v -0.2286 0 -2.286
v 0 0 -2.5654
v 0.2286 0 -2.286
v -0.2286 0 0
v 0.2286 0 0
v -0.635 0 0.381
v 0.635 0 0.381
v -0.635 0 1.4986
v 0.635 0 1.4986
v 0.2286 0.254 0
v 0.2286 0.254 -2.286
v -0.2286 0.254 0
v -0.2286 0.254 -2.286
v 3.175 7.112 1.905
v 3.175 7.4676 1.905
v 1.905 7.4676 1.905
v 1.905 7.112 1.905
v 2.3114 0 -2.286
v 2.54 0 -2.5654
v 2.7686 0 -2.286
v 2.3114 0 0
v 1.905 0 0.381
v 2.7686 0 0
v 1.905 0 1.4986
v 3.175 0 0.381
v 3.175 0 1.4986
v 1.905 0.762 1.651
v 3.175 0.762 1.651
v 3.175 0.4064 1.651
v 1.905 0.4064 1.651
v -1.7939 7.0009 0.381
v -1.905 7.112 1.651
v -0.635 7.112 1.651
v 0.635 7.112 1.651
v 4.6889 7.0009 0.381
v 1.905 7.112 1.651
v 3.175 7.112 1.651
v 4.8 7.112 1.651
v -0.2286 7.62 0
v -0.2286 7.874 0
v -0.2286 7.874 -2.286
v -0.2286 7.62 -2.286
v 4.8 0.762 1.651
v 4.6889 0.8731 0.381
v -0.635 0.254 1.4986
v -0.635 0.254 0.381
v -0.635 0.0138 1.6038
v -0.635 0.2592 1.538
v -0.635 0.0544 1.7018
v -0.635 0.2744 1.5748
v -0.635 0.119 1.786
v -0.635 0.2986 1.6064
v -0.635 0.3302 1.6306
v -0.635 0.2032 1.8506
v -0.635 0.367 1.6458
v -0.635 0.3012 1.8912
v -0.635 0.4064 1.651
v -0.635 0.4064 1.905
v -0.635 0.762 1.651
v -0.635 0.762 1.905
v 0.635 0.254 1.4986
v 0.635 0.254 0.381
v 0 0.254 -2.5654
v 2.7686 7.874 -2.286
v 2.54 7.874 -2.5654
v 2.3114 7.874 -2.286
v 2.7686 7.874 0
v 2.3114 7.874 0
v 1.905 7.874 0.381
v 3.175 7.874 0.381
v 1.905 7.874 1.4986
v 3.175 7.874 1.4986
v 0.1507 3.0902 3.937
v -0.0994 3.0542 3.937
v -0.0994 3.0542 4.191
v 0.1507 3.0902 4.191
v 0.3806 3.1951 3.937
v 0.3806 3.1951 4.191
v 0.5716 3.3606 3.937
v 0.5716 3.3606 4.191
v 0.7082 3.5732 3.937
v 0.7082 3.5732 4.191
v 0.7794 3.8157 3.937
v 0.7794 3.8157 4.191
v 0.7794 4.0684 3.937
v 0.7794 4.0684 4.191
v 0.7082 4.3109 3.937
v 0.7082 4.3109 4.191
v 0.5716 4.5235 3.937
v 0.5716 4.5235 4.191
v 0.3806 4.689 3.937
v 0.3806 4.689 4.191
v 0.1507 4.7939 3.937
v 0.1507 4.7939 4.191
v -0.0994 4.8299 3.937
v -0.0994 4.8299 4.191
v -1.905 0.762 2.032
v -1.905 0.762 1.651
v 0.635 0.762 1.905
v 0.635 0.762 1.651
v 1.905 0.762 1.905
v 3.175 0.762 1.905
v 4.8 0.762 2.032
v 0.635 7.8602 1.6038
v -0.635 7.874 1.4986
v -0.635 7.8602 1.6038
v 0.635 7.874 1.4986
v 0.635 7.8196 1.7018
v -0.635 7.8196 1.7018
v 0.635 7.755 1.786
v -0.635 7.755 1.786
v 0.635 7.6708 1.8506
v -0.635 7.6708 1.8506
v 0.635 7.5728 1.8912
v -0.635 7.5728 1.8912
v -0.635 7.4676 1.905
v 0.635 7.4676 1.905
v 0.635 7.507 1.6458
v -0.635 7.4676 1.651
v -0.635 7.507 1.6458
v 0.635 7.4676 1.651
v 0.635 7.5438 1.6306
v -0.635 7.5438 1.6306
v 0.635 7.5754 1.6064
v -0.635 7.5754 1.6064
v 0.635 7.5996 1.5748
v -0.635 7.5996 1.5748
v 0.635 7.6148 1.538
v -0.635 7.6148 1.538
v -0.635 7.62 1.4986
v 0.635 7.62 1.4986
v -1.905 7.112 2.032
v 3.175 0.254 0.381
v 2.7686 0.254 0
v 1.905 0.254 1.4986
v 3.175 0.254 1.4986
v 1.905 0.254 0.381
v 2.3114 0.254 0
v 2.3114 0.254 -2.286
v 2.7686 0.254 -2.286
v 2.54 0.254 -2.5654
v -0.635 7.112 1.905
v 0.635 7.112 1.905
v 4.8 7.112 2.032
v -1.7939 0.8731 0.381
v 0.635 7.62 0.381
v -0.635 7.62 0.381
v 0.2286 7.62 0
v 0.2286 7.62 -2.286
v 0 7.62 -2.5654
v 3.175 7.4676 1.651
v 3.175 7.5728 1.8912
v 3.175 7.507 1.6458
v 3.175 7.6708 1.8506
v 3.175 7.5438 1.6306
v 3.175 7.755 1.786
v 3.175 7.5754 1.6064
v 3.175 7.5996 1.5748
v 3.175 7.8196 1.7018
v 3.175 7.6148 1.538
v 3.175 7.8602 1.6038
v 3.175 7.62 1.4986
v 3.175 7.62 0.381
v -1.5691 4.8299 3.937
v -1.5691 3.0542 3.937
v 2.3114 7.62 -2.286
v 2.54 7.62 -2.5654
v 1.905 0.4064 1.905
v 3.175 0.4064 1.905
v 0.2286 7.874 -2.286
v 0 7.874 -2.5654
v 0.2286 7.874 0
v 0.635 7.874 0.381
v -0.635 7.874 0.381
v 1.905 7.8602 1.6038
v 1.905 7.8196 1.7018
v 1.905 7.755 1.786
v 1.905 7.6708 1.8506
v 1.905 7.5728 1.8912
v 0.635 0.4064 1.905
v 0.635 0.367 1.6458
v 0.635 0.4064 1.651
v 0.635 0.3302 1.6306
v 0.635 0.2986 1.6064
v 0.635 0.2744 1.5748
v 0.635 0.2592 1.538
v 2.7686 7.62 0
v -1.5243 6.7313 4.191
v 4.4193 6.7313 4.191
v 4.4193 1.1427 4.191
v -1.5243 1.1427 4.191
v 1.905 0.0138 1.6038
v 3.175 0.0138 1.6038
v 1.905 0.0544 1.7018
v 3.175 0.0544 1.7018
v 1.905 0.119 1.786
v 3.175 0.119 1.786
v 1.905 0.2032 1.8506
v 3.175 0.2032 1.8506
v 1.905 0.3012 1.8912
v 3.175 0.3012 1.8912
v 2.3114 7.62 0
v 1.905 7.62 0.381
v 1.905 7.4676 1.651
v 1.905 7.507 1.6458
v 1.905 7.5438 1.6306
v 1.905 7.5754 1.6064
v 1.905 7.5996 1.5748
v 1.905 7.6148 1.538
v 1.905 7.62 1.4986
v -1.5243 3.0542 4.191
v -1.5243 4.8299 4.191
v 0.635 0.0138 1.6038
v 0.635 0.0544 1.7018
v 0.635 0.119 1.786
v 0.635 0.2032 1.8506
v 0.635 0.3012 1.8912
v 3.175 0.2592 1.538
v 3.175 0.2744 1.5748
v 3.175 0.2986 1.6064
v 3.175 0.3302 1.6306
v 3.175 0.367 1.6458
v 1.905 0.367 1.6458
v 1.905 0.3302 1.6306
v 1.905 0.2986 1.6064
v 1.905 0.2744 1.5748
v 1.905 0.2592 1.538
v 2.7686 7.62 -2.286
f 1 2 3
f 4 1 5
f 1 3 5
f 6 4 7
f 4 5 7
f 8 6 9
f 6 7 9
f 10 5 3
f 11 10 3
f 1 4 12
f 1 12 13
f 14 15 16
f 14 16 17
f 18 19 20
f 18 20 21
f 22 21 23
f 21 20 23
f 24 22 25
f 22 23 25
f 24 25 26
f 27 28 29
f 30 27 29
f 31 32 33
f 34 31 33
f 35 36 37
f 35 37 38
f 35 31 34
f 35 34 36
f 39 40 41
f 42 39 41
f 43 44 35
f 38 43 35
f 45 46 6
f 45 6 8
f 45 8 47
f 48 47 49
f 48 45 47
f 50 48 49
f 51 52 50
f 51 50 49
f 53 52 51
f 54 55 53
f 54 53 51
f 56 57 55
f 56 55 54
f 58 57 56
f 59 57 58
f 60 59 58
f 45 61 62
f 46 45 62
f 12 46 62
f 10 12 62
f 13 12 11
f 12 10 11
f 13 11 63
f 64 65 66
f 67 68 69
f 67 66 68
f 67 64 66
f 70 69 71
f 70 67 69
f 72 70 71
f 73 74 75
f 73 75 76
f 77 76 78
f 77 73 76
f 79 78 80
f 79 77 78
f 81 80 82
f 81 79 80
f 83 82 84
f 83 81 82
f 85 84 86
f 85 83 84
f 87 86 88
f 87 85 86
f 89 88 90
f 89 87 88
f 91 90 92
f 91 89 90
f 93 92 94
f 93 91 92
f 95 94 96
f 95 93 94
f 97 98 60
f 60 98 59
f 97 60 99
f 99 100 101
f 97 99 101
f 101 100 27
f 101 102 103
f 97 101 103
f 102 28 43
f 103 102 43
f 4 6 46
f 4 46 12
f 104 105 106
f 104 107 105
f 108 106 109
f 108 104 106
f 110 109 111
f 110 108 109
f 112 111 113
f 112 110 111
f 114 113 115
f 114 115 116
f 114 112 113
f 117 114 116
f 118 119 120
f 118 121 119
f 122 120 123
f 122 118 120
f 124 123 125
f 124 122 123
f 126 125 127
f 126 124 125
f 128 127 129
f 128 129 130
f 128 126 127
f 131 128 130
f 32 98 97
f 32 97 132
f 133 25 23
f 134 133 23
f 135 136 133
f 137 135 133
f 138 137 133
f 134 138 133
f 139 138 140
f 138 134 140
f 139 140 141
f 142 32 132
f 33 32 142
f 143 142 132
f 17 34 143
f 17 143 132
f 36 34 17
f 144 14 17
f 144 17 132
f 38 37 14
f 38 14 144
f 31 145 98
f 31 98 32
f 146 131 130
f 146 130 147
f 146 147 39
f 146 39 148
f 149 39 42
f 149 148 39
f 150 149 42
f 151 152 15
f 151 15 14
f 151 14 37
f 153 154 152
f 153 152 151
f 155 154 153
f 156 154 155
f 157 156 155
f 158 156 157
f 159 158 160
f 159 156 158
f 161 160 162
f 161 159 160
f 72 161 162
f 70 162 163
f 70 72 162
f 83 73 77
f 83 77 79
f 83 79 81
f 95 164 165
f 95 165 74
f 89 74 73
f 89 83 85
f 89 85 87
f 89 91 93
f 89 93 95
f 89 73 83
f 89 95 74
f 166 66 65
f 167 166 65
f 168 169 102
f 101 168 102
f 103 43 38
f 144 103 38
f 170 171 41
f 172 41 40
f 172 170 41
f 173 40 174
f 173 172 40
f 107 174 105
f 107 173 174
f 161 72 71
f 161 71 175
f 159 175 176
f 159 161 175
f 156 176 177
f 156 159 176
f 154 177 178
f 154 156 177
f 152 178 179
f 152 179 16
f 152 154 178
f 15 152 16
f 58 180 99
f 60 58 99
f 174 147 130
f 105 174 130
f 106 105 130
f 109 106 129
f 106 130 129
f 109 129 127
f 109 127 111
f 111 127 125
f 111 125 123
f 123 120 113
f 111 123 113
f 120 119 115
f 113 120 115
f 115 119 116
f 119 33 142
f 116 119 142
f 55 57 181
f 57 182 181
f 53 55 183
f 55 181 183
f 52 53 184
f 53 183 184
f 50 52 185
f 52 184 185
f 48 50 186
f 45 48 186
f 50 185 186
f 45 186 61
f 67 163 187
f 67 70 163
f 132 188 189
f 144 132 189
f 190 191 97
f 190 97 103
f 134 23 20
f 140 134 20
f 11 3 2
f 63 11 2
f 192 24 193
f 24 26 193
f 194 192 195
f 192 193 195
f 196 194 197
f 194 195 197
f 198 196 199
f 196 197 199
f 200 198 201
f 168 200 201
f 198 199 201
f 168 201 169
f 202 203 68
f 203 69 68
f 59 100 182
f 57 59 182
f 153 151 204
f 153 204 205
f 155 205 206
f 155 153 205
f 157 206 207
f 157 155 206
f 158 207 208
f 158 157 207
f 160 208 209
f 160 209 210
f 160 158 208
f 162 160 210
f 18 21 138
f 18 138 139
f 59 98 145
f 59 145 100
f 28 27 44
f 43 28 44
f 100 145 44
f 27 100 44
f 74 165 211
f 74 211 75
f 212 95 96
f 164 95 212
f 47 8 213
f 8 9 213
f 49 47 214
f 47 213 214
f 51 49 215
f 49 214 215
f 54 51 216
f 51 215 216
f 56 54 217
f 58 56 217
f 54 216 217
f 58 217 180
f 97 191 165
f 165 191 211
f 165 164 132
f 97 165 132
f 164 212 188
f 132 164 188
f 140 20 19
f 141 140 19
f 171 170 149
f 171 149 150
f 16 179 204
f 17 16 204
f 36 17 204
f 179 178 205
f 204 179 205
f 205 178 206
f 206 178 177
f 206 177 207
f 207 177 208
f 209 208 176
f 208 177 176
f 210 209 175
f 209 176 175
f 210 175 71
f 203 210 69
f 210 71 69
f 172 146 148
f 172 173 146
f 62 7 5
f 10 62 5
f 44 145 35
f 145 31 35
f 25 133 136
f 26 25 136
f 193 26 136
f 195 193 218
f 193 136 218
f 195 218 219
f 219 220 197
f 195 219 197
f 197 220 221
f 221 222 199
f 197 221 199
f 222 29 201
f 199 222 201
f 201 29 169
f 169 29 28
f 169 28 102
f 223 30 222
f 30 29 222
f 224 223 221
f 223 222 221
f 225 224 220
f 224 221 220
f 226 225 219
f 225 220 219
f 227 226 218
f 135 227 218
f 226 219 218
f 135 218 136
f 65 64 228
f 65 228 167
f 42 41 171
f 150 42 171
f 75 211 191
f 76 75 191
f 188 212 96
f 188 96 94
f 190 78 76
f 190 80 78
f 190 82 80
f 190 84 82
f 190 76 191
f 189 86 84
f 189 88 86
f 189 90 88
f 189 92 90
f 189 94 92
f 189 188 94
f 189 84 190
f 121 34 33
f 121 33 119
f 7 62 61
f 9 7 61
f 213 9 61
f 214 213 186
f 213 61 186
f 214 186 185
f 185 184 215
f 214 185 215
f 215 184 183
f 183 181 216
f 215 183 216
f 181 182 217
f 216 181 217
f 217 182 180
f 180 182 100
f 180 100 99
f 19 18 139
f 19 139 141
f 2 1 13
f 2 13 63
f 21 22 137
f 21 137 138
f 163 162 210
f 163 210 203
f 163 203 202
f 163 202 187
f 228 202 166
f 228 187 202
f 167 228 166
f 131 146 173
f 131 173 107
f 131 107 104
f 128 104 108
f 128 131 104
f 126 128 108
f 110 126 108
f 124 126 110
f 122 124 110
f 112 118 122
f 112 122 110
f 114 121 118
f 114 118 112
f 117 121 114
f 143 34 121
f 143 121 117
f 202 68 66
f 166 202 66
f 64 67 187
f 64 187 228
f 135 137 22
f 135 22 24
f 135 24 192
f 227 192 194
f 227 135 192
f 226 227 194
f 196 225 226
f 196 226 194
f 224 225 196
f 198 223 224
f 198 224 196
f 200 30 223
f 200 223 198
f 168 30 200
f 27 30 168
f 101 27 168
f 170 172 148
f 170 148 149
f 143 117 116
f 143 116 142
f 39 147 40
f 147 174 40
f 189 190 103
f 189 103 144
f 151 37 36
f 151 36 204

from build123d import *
from OCP.BRepFilletAPI import BRepFilletAPI_MakeChamfer

# Parameters (mm, degrees)
SKETCH1_W                = 6.705
SKETCH1_H                = 6.35
BASE_EXTRUDE_DEPTH       = 3.81
CHAMFER1_SIZE            = 2.159
CHAMFER1_SIZE2           = 0.380689951
CHAMFER2_SIZE            = 1.27
CHAMFER2_SIZE2           = 0.111110603
CUT_EXTRUDE1_START       = 3.937
CUT_EXTRUDE1_DEPTH       = 0.254
BOSS_EXTRUDE_THIN3_DEPTH = 0.635
CUT_EXTRUDE3_DEPTH       = 10.549085035
CUT_EXTRUDE4_DEPTH       = 10.549085035
LPATTERN2_COUNT          = 2
LPATTERN2_PITCH          = 2.54
MIRROR1_COPY_1_DEPTH     = 0.635
MIRROR1_COPY_2_DEPTH     = 10.549085035
MIRROR1_COPY_3_DEPTH     = 10.549085035


# Read off the part's stored shape, not the designer's step: Cut-Extrude1
with BuildPart() as part:
    # Sketch1 → Base-Extrude (new body)
    with BuildSketch(Plane.XY.offset(0.381)):
        with Locations((1.4475, 3.937)):
            Rectangle(SKETCH1_W, SKETCH1_H)
    extrude(amount=BASE_EXTRUDE_DEPTH)

    # Chamfer1: one chamfer whose edges measure the first distance from different faces: ONE call of the kernel's chamfer builder (chamfer() names one face for all edges)
    chamfer1_edges_1 = [part.edges().sort_by_distance(p)[0] for p in [
        (4.8, 3.937, 4.191),
    ]]
    chamfer1_side_1 = [part.faces().sort_by_distance(p)[0] for p in [
        (4.8, 3.937, 2.286),
    ]]
    chamfer1_edges_2 = [part.edges().sort_by_distance(p)[0] for p in [
        (1.4475, 7.112, 4.191),
    ]]
    chamfer1_side_2 = [part.faces().sort_by_distance(p)[0] for p in [
        (1.4475, 7.112, 2.286),
    ]]
    chamfer1_edges_3 = [part.edges().sort_by_distance(p)[0] for p in [
        (-1.905, 3.937, 4.191),
    ]]
    chamfer1_side_3 = [part.faces().sort_by_distance(p)[0] for p in [
        (-1.905, 3.937, 2.286),
    ]]
    chamfer1_edges_4 = [part.edges().sort_by_distance(p)[0] for p in [
        (1.4475, 0.762, 4.191),
    ]]
    chamfer1_side_4 = [part.faces().sort_by_distance(p)[0] for p in [
        (1.4475, 0.762, 2.286),
    ]]
    chamfer1 = BRepFilletAPI_MakeChamfer(part.part.solid().wrapped)
    for e in chamfer1_edges_1:
        chamfer1.Add(CHAMFER1_SIZE, CHAMFER1_SIZE2, e.wrapped, chamfer1_side_1[0].wrapped)  # the first distance lies on this face
    for e in chamfer1_edges_2:
        chamfer1.Add(CHAMFER1_SIZE, CHAMFER1_SIZE2, e.wrapped, chamfer1_side_2[0].wrapped)  # the first distance lies on this face
    for e in chamfer1_edges_3:
        chamfer1.Add(CHAMFER1_SIZE, CHAMFER1_SIZE2, e.wrapped, chamfer1_side_3[0].wrapped)  # the first distance lies on this face
    for e in chamfer1_edges_4:
        chamfer1.Add(CHAMFER1_SIZE, CHAMFER1_SIZE2, e.wrapped, chamfer1_side_4[0].wrapped)  # the first distance lies on this face
    add(Compound.cast(chamfer1.Shape()), mode=Mode.REPLACE)

    # Chamfer2: one chamfer whose edges measure the first distance from different faces: ONE call of the kernel's chamfer builder (chamfer() names one face for all edges)
    chamfer2_edges_1 = [part.edges().sort_by_distance(p)[0] for p in [
        (1.4475, 7.112, 0.381),
    ]]
    chamfer2_side_1 = [part.faces().sort_by_distance(p)[0] for p in [
        (1.4475, 7.112, 1.2065),
    ]]
    chamfer2_edges_2 = [part.edges().sort_by_distance(p)[0] for p in [
        (4.8, 3.937, 0.381),
    ]]
    chamfer2_side_2 = [part.faces().sort_by_distance(p)[0] for p in [
        (4.8, 3.937, 1.2065),
    ]]
    chamfer2_edges_3 = [part.edges().sort_by_distance(p)[0] for p in [
        (1.4475, 0.762, 0.381),
    ]]
    chamfer2_side_3 = [part.faces().sort_by_distance(p)[0] for p in [
        (1.4475, 0.762, 1.2065),
    ]]
    chamfer2_edges_4 = [part.edges().sort_by_distance(p)[0] for p in [
        (-1.905, 3.937, 0.381),
    ]]
    chamfer2_side_4 = [part.faces().sort_by_distance(p)[0] for p in [
        (-1.905, 3.937, 1.2065),
    ]]
    chamfer2 = BRepFilletAPI_MakeChamfer(part.part.solid().wrapped)
    for e in chamfer2_edges_1:
        chamfer2.Add(CHAMFER2_SIZE, CHAMFER2_SIZE2, e.wrapped, chamfer2_side_1[0].wrapped)  # the first distance lies on this face
    for e in chamfer2_edges_2:
        chamfer2.Add(CHAMFER2_SIZE, CHAMFER2_SIZE2, e.wrapped, chamfer2_side_2[0].wrapped)  # the first distance lies on this face
    for e in chamfer2_edges_3:
        chamfer2.Add(CHAMFER2_SIZE, CHAMFER2_SIZE2, e.wrapped, chamfer2_side_3[0].wrapped)  # the first distance lies on this face
    for e in chamfer2_edges_4:
        chamfer2.Add(CHAMFER2_SIZE, CHAMFER2_SIZE2, e.wrapped, chamfer2_side_4[0].wrapped)  # the first distance lies on this face
    add(Compound.cast(chamfer2.Shape()), mode=Mode.REPLACE)

    # Cut-Extrude1 outline → Cut-Extrude1 (cut)
    with BuildSketch(Plane.XY.offset(CUT_EXTRUDE1_START)):
        with BuildLine():
            Line((-0.099439262, 4.829907029), (-3, 4.829907029))
            Line((-3, 4.829907029), (-3, 3.054205915))
            Line((-3, 3.054205915), (-0.099439262, 3.054205915))
            ThreePointArc((-0.099439262, 3.054205915), (0.788411294, 3.942056472), (-0.099439262, 4.829907029))
        make_face()
    extrude(amount=CUT_EXTRUDE1_DEPTH, mode=Mode.SUBTRACT)

    # Sketch4 → Boss-Extrude-Thin3 (add, symmetric)
    with BuildSketch(Plane(origin=(0, 0, 0), x_dir=(0, 0, -1), z_dir=(1, 0, 0))):
        with BuildLine():
            Line((2.5654, 0), (-1.4986, 0))
            ThreePointArc((-1.4986, 0), (-1.785968196, 0.119031804), (-1.905, 0.4064))
            Line((-1.905, 0.4064), (-1.905, 1.120296425))
            Line((-1.905, 1.120296425), (-1.651, 1.120296425))
            Line((-1.651, 1.120296425), (-1.651, 0.4064))
            ThreePointArc((-1.651, 0.4064), (-1.606363073, 0.298636927), (-1.4986, 0.254))
            Line((-1.4986, 0.254), (2.5654, 0.254))
            Line((2.5654, 0.254), (2.5654, 0))
        make_face()
    boss_extrude_thin3 = extrude(amount=BOSS_EXTRUDE_THIN3_DEPTH, both=True)

    # Sketch8 → Cut-Extrude3 (cut, through all)
    with BuildSketch(Plane.XZ):
        Polygon((-0.635, 0.381), (-0.2286, 0), (-0.2286, -2.286), (0, -2.5654), (-0.635, -2.5654), align=None)
    cut_extrude3 = extrude(amount=-CUT_EXTRUDE3_DEPTH, mode=Mode.SUBTRACT)

    # Sketch9 → Cut-Extrude4 (cut, through all)
    with BuildSketch(Plane.XZ):
        Polygon((0.635, 0.381), (0.2286, 0), (0.2286, -2.286), (0, -2.5654), (0.635, -2.5654), align=None)
    cut_extrude4 = extrude(amount=-CUT_EXTRUDE4_DEPTH, mode=Mode.SUBTRACT)

    # LPattern2: Boss-Extrude-Thin3, Cut-Extrude3, Cut-Extrude4 ×2
    with Locations(*[(i * LPATTERN2_PITCH, 0, 0) for i in range(1, LPATTERN2_COUNT)]):
        add(boss_extrude_thin3)
        add(cut_extrude3, mode=Mode.SUBTRACT)
        add(cut_extrude4, mode=Mode.SUBTRACT)

    # Mirror1: Boss-Extrude-Thin3, Cut-Extrude3, Cut-Extrude4 across plane
    add(boss_extrude_thin3.mirror(Plane.ZX.offset(3.937)))
    add(cut_extrude3.mirror(Plane.ZX.offset(3.937)), mode=Mode.SUBTRACT)
    add(cut_extrude4.mirror(Plane.ZX.offset(3.937)), mode=Mode.SUBTRACT)

    # Mirror1 copy 1 sketch → Mirror1 copy 1 (add, symmetric)
    with BuildSketch(Plane(origin=(2.54, 7.874, 0), x_dir=(0, 0, -1), z_dir=(1, 0, 0))):
        with BuildLine():
            Line((2.5654, 0), (-1.4986, 0))
            ThreePointArc((-1.4986, 0), (-1.785968196, -0.119031804), (-1.905, -0.4064))
            Line((-1.905, -0.4064), (-1.905, -1.120296425))
            Line((-1.905, -1.120296425), (-1.651, -1.120296425))
            Line((-1.651, -1.120296425), (-1.651, -0.4064))
            ThreePointArc((-1.651, -0.4064), (-1.606363073, -0.298636927), (-1.4986, -0.254))
            Line((-1.4986, -0.254), (2.5654, -0.254))
            Line((2.5654, -0.254), (2.5654, 0))
        make_face()
    extrude(amount=MIRROR1_COPY_1_DEPTH, both=True)

    # Mirror1 copy 2 sketch → Mirror1 copy 2 (cut, through all)
    with BuildSketch(Plane(origin=(2.54, 7.874, 0), x_dir=(1, 0, 0), z_dir=(0, 1, 0))):
        Polygon((-0.635, -0.381), (-0.2286, 0), (-0.2286, 2.286), (0, 2.5654), (-0.635, 2.5654), align=None)
    extrude(amount=-MIRROR1_COPY_2_DEPTH, mode=Mode.SUBTRACT)

    # Mirror1 copy 3 sketch → Mirror1 copy 3 (cut, through all)
    with BuildSketch(Plane(origin=(2.54, 7.874, 0), x_dir=(1, 0, 0), z_dir=(0, 1, 0))):
        Polygon((0.635, -0.381), (0.2286, 0), (0.2286, 2.286), (0, 2.5654), (0.635, 2.5654), align=None)
    extrude(amount=-MIRROR1_COPY_3_DEPTH, mode=Mode.SUBTRACT)


solid = part.part
